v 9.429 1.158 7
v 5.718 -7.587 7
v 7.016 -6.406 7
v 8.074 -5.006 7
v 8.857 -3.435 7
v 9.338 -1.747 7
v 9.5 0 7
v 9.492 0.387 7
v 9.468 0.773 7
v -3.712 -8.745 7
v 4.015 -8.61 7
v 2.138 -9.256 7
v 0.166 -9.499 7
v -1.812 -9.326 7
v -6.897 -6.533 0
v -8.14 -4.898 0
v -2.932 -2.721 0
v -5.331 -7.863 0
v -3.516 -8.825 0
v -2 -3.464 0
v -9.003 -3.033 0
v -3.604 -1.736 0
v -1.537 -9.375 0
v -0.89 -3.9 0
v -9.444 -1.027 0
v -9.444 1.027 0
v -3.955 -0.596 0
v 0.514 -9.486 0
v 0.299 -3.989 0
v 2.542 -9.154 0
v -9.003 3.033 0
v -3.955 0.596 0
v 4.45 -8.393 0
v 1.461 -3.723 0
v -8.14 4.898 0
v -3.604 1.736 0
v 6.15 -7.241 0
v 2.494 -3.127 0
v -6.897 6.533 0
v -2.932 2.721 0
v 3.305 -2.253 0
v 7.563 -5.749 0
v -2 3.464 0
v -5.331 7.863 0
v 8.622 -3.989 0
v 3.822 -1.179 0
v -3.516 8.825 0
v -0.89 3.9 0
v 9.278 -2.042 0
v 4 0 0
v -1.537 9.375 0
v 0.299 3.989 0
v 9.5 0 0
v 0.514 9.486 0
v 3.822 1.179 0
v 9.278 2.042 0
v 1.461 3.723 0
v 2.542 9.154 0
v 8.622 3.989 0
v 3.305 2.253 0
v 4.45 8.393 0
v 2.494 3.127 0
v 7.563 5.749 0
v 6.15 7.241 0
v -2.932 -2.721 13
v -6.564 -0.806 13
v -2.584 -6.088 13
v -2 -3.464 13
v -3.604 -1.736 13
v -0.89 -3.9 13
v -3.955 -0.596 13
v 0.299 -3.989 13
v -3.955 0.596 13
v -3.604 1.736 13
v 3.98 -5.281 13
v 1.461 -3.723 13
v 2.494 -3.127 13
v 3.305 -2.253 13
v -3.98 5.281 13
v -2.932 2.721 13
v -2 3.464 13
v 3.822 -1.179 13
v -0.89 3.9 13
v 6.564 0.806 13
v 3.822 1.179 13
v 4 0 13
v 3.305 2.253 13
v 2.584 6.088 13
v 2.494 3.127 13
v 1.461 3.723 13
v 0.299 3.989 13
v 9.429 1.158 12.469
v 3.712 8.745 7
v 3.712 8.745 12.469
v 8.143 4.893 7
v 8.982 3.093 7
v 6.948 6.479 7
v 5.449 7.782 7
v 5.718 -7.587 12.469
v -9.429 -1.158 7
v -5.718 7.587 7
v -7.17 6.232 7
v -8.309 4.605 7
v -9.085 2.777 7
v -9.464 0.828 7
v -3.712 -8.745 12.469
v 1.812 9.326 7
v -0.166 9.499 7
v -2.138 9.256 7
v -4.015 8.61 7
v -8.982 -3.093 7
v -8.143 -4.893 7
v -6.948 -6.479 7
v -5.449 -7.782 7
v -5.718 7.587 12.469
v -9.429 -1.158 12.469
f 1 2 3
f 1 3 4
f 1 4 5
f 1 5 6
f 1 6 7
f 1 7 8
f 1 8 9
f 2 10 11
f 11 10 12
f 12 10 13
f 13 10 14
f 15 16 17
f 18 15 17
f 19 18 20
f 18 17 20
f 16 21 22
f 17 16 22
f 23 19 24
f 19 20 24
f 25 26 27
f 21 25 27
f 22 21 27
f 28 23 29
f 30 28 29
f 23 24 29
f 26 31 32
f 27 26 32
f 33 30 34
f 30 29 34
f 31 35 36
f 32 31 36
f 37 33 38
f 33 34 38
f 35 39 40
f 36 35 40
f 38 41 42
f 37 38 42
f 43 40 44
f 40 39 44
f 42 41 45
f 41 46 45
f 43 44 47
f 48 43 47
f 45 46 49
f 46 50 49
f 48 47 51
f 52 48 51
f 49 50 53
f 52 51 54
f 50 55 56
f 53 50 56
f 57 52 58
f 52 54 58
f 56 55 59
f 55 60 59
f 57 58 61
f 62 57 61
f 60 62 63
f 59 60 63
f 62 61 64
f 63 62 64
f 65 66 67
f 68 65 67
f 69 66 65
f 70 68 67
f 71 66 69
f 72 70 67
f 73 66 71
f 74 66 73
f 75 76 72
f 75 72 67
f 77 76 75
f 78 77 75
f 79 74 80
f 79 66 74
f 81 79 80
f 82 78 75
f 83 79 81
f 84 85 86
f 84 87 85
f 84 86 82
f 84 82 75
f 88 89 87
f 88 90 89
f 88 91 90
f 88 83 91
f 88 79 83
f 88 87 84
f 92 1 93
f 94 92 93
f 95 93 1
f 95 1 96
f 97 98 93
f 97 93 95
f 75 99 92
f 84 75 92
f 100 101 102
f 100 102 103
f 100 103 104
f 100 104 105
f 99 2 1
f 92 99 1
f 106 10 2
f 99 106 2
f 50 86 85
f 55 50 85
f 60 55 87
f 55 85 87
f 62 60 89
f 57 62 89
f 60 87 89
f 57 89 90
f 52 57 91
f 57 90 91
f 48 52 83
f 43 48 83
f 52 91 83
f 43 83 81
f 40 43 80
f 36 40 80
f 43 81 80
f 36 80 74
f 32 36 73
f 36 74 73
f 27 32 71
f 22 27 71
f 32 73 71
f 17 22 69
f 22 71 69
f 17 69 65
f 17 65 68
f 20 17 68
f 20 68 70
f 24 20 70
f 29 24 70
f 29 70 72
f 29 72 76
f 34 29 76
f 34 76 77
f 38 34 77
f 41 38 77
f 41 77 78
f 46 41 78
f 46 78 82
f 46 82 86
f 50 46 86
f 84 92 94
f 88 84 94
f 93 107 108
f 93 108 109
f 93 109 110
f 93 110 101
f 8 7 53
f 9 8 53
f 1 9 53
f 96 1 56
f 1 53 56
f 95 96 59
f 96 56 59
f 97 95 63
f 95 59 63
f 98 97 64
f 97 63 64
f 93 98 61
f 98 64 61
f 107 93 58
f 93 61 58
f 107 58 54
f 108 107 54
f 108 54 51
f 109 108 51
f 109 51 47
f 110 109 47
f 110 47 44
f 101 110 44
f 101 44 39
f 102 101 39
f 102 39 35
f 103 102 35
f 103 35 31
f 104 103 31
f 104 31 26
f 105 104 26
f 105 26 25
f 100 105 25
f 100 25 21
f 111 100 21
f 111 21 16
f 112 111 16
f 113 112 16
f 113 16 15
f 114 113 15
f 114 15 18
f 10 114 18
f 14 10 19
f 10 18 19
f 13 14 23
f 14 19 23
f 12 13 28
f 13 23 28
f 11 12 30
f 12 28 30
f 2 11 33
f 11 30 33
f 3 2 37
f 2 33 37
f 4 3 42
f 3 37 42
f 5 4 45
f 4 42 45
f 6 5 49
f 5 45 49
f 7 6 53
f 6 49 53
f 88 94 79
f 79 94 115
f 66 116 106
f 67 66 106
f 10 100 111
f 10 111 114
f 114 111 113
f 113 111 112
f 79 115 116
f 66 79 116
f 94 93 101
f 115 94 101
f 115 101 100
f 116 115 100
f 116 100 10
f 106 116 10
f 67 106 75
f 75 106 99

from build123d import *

# Parameters (mm, degrees)
CROQUIS1_R              = 9.5
SALIENTE_EXTRUIR1_DEPTH = 7
SALIENTE_EXTRUIR2_DEPTH = 6
CROQUIS3_R              = 4
CORTAR_EXTRUIR1_DEPTH   = 14
CHAFL_N1_SIZE           = 2.5
CHAFL_N1_SIZE2          = 0.531391404


with BuildPart() as part:
    # Croquis1 → Saliente-Extruir1 (new body)
    with BuildSketch(Plane.XY):
        Circle(CROQUIS1_R)
    extrude(amount=SALIENTE_EXTRUIR1_DEPTH)

    # Croquis2 → Saliente-Extruir2 (add)
    with BuildSketch(Plane.XY.offset(7)):
        Polygon((3.711506212, 8.744982655), (-5.717624029, 7.586749994), (-9.429130241, -1.158232661), (-3.711506212, -8.744982655), (5.717624029, -7.586749994), (9.429130241, 1.158232661), align=None)
    extrude(amount=SALIENTE_EXTRUIR2_DEPTH)

    # Croquis3 → Cortar-Extruir1 (cut, through all)
    with BuildSketch(Plane.XY.offset(13)):
        Circle(CROQUIS3_R)
    extrude(amount=-CORTAR_EXTRUIR1_DEPTH, mode=Mode.SUBTRACT)

    # Chaflán1
    chafl_n1_edges = [part.edges().sort_by_distance(p)[0] for p in [
        (6.570318227, 4.951607658, 13),
        (-1.003058908, 8.165866324, 13),
        (-7.573377135, 3.214258666, 13),
        (-6.570318227, -4.951607658, 13),
        (1.003058908, -8.165866324, 13),
        (7.573377135, -3.214258666, 13),
    ]]
    chafl_n1_side = [part.faces().sort_by_distance(p)[0] for p in [
        (-0.97170094, 7.910582237, 13),
    ]]
    chamfer(chafl_n1_edges, length=CHAFL_N1_SIZE, length2=CHAFL_N1_SIZE2, reference=chafl_n1_side[0])


solid = part.part
